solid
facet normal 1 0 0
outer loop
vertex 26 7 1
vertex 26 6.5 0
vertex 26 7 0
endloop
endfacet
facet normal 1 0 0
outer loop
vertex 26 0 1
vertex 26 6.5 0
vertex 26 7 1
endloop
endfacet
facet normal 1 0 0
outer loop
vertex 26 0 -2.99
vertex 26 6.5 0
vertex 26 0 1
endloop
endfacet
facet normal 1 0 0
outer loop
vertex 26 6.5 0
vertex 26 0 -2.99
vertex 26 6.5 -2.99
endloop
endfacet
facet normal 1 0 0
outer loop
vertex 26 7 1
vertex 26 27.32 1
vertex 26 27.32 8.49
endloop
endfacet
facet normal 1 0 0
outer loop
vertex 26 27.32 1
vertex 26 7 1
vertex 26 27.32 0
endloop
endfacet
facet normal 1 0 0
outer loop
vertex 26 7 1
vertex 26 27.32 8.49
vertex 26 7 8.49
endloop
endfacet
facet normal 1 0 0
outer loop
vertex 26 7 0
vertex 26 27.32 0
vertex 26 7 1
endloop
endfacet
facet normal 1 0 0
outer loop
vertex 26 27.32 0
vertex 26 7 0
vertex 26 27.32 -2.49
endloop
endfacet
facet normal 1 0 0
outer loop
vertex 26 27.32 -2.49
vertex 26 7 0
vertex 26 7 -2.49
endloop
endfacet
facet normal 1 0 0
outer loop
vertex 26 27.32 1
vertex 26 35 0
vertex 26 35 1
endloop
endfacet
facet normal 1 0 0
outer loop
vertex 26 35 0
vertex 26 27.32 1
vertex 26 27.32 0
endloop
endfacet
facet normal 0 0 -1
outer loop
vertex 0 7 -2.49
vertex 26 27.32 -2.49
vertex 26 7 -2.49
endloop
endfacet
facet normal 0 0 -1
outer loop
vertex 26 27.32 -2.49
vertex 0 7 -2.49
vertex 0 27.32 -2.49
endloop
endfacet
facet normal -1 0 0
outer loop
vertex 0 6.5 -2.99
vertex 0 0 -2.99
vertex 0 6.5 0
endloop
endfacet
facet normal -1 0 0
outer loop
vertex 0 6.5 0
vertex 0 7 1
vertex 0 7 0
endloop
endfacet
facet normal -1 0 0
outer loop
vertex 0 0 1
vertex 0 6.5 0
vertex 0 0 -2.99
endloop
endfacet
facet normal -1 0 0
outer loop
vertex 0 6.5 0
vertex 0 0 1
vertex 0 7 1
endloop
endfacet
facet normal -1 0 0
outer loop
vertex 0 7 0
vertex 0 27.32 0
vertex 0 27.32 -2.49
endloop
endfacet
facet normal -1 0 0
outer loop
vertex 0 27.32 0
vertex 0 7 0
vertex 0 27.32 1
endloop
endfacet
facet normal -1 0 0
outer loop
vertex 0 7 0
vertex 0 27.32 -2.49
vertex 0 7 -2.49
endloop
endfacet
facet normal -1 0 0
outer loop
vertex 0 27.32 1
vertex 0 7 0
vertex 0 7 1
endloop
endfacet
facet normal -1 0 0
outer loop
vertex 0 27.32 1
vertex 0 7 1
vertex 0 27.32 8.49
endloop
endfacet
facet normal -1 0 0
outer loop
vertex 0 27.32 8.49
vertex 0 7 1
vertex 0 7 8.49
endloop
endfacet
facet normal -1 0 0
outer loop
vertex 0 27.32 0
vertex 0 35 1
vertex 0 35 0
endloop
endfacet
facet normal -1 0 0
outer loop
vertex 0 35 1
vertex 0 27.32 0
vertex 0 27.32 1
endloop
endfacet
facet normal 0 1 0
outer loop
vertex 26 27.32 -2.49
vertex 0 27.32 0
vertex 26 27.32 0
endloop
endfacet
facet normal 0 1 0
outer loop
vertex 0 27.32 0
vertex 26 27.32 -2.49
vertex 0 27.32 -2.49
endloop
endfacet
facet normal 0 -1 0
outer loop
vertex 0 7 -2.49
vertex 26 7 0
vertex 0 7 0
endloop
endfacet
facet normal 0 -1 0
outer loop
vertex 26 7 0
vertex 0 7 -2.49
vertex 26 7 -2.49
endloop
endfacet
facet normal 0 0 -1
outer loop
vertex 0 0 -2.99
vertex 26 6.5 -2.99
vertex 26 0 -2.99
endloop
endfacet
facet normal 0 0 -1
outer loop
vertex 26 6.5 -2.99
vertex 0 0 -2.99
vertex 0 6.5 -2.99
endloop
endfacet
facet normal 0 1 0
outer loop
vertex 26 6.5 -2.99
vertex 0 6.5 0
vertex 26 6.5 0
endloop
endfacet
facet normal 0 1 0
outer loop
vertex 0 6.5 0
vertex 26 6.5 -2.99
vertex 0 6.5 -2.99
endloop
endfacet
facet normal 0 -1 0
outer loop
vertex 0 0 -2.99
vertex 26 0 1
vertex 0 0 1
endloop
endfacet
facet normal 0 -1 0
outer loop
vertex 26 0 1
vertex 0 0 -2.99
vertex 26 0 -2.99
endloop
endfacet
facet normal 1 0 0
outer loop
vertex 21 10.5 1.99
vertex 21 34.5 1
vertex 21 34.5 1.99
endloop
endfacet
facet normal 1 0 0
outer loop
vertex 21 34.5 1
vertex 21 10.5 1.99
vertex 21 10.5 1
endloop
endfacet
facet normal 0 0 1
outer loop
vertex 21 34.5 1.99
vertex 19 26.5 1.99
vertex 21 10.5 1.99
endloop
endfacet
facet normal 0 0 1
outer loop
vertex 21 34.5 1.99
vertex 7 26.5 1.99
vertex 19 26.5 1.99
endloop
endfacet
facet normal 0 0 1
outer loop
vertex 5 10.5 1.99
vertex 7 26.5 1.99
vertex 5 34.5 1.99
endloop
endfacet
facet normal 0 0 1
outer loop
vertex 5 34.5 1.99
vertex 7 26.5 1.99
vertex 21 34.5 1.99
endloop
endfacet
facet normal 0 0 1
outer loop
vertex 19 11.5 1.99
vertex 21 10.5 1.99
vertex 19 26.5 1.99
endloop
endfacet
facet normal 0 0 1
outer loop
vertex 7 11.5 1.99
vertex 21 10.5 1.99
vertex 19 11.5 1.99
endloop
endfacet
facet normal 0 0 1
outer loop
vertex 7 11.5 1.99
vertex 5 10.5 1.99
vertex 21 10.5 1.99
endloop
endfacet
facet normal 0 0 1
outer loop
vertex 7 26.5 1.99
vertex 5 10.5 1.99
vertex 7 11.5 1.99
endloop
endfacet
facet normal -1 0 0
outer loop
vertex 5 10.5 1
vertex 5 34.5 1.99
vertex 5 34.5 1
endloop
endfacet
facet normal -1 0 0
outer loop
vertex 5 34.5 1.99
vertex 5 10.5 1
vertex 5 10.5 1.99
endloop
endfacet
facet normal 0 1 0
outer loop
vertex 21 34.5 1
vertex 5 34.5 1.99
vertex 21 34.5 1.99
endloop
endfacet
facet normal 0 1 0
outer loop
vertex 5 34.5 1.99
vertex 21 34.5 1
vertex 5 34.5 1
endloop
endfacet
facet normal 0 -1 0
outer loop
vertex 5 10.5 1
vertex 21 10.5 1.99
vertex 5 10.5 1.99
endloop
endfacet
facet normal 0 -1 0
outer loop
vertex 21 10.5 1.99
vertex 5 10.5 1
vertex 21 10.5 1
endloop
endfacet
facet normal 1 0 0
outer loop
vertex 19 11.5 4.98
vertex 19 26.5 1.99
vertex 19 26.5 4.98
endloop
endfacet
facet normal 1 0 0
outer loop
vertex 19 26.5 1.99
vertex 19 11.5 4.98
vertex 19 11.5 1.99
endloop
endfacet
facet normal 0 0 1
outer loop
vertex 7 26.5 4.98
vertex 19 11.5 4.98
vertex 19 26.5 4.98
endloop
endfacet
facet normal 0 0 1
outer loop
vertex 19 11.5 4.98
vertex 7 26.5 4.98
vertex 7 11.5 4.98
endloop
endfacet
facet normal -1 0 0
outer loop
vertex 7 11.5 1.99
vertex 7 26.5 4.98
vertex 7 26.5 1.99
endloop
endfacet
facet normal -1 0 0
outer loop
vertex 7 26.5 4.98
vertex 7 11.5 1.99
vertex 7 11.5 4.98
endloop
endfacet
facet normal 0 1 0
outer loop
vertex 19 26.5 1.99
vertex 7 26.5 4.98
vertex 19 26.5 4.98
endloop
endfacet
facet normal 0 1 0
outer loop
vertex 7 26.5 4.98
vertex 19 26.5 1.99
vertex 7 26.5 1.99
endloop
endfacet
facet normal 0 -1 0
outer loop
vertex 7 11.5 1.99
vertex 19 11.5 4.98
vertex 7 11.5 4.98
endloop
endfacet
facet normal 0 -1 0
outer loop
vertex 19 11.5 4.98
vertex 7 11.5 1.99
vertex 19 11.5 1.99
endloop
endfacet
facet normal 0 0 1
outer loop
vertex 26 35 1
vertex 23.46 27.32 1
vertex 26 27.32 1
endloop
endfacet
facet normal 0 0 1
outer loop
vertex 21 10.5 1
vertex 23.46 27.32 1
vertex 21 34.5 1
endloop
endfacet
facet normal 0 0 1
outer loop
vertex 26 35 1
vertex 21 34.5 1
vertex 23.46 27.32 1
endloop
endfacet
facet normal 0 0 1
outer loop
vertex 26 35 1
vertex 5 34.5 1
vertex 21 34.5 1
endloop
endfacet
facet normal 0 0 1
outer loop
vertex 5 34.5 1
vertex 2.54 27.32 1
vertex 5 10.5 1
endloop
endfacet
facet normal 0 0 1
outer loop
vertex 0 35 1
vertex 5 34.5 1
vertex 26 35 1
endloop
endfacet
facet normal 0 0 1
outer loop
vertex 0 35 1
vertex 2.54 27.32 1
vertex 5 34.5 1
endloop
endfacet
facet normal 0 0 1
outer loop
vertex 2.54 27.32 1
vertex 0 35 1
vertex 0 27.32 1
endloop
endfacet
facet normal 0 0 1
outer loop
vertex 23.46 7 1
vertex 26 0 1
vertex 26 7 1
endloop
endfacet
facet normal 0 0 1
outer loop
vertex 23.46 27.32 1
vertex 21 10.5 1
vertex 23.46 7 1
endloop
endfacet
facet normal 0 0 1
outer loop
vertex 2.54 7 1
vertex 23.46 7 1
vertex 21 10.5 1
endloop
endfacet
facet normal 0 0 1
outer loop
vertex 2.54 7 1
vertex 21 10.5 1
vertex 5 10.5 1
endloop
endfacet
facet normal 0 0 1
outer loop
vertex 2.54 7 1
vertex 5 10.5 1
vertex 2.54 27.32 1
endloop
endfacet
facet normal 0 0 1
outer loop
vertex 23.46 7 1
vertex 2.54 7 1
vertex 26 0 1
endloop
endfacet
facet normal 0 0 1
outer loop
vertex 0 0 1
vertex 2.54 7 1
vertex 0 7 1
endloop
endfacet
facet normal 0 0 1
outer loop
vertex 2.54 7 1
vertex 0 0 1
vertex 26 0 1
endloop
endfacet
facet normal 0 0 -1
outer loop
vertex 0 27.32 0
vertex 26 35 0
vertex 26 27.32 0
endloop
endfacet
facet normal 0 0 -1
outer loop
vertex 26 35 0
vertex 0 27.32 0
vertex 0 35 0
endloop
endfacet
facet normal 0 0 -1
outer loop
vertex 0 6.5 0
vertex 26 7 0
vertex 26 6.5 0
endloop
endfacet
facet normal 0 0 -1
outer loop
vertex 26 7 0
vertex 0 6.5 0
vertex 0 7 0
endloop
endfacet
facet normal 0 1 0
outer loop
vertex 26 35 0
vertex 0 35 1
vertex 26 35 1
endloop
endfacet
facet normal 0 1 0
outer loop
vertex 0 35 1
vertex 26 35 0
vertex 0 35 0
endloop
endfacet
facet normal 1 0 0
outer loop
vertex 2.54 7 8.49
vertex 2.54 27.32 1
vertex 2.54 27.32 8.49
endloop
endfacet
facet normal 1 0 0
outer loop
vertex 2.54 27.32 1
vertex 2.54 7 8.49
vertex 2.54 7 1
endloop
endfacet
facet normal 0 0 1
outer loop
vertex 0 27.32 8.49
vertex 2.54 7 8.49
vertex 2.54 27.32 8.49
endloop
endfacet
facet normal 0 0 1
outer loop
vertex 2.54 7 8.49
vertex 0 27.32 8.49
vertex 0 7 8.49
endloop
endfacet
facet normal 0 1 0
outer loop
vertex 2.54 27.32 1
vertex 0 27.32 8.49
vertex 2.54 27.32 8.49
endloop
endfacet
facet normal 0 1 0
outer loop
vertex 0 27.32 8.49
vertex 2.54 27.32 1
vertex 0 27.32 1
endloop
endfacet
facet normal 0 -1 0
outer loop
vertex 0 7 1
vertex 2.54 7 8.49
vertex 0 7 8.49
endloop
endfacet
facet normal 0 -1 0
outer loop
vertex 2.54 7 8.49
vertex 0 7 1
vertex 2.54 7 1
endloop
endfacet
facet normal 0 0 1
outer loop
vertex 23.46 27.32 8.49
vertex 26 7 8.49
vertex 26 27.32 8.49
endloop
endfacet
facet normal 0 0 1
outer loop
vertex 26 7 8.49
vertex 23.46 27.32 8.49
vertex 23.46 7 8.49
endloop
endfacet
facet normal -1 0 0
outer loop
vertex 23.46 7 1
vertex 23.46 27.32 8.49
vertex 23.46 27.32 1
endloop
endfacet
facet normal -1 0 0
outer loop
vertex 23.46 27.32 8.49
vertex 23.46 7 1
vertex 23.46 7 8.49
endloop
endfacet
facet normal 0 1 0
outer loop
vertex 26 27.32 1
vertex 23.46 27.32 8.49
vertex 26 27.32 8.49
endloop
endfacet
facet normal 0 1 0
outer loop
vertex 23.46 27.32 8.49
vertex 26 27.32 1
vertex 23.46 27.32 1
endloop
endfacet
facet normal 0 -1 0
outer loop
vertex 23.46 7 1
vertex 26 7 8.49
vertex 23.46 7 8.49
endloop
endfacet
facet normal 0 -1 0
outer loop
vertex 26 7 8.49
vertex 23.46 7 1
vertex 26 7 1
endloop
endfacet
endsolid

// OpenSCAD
// file: esp8266mod.scad
include <../electronics/config.scad>;


/**
 * PCB with Espressif ESP8266 Wifi MCU and onboard antenna
 */
module esp8266mod(
            // PCB outline
            pcb_color = "black",
            pcb_size_x = 16.0,
            pcb_size_y = 24.0,
            pcb_size_z = 1.0,

            // MCU shield outline
            shield_color = "lightgray",
            shield_size_x = 12,
            shield_size_y = 15,
            shield_size_z = 3,
            shield_inset_x = 2,
            shield_inset_y = 1
        )
{
    // Board
    color(pcb_color)
    cube([pcb_size_x, pcb_size_y, pcb_size_z]);

    // MCU shield
    color(shield_color)
    translate([shield_inset_x, shield_inset_y, pcb_size_z-nothing])
    cube([shield_size_x, shield_size_y, shield_size_z]);
}

esp8266mod();
// file: pins.scad
module socket(count, spacing=2.54)
{
    // Component-specific parameters
    socket_color = "black";
    socket_z = 7.5;

    pin_color = "lightgray";
    pin_radius = spacing/4;
    pin_z = 2;


    // Solder pin
    // color(pin_color)
    // translate([spacing/2, spacing/2, -pin_z])
    // cylinder(
    //         r = pin_radius,
    //         h = pin_z + nothing
    //     );

    // Socket
    color(socket_color)
    translate([-spacing/2, 0, 0])
    cube([spacing, count*spacing, socket_z]);
}


module pins(count, spacing=2.54)
{
    socket(count, spacing);

    // TODO...
}
// file: ../electronics/config.scad
// Rendering: Level of detail
$fn = 80;

// Quickfix for rendering artifacts on overlapping surfaces
nothing = 0.01;

/*
 * Globally relevant model parameters
 */
d1mini_pcb_size_x = 26;
d1mini_pcb_size_y = 35;

adapter_pcb_size_x = 26;
adapter_pcb_size_y = 29;
adapter_pcb_size_z = 1.0;
adapter_pin_spacing = 2.54;

sensor_pcb_size_x = 20;
sensor_pcb_size_y = 20;
sensor_pcb_size_z = 1.0;

led_socket_pin_spacing = 2.54;
led_socket_pin_count = 4;
led_socket_size_x = led_socket_pin_count * led_socket_pin_spacing;
led_diameter = 5.0;
// main file
include <../electronics/config.scad>;
use <pins.scad>;
use <esp8266mod.scad>;


/**
 * D1-mini breakout board with Espressif ESP8266 Wifi MCU module
 */
module d1mini(
            // PCB outline
            pcb_color = "darkblue",
            pcb_size_x = d1mini_pcb_size_x,
            pcb_size_y = d1mini_pcb_size_y,
            pcb_size_z = 1.0,

            // Pins
            pin_color = "black",
            pin_spacing = 2.54,
            pin_count = 8,
            pins_size_z = 7.5,
            pins_inset_y = 7.0,

            // Placeholders for SMD components
            smd_color = "gray",
            smd_size_z = 2.5,
            placeholder_size_y = 6.5,
            placeholder_size_z = 3.0,

            // MCU module
            mod_inset_x = 5.0,
            mod_inset_y = 10.5
        )
{
    pins_size_y = pin_count * pin_spacing;
    pins_size_x = pin_spacing;

    // PCB outline
    color(pcb_color)
    cube([pcb_size_x, pcb_size_y, pcb_size_z]);

    // Pins left
    translate([
        pin_spacing/2,
        pins_inset_y,
        pcb_size_z - nothing
    ])
    socket(pin_count, spacing=pin_spacing);

    // Pins right
    translate([
        pcb_size_x - pin_spacing/2,
        pins_inset_y,
        pcb_size_z - nothing
    ])
    pins(pin_count, spacing=pin_spacing);

    // Generic placeholders
    color(smd_color)
    {
        // SMD parts
        translate([0, pins_inset_y, -smd_size_z + nothing])
        cube([
            pcb_size_x,
            pins_size_y,
            smd_size_z
        ]);

        // USB port and reset button
        translate([0, 0, -placeholder_size_z + nothing])
        cube([
            pcb_size_x,
            placeholder_size_y,
            placeholder_size_z
        ]);
    }

    // MCU board
    translate([mod_inset_x, mod_inset_y, pcb_size_z-nothing])
    esp8266mod();
}


// Preview
d1mini();
